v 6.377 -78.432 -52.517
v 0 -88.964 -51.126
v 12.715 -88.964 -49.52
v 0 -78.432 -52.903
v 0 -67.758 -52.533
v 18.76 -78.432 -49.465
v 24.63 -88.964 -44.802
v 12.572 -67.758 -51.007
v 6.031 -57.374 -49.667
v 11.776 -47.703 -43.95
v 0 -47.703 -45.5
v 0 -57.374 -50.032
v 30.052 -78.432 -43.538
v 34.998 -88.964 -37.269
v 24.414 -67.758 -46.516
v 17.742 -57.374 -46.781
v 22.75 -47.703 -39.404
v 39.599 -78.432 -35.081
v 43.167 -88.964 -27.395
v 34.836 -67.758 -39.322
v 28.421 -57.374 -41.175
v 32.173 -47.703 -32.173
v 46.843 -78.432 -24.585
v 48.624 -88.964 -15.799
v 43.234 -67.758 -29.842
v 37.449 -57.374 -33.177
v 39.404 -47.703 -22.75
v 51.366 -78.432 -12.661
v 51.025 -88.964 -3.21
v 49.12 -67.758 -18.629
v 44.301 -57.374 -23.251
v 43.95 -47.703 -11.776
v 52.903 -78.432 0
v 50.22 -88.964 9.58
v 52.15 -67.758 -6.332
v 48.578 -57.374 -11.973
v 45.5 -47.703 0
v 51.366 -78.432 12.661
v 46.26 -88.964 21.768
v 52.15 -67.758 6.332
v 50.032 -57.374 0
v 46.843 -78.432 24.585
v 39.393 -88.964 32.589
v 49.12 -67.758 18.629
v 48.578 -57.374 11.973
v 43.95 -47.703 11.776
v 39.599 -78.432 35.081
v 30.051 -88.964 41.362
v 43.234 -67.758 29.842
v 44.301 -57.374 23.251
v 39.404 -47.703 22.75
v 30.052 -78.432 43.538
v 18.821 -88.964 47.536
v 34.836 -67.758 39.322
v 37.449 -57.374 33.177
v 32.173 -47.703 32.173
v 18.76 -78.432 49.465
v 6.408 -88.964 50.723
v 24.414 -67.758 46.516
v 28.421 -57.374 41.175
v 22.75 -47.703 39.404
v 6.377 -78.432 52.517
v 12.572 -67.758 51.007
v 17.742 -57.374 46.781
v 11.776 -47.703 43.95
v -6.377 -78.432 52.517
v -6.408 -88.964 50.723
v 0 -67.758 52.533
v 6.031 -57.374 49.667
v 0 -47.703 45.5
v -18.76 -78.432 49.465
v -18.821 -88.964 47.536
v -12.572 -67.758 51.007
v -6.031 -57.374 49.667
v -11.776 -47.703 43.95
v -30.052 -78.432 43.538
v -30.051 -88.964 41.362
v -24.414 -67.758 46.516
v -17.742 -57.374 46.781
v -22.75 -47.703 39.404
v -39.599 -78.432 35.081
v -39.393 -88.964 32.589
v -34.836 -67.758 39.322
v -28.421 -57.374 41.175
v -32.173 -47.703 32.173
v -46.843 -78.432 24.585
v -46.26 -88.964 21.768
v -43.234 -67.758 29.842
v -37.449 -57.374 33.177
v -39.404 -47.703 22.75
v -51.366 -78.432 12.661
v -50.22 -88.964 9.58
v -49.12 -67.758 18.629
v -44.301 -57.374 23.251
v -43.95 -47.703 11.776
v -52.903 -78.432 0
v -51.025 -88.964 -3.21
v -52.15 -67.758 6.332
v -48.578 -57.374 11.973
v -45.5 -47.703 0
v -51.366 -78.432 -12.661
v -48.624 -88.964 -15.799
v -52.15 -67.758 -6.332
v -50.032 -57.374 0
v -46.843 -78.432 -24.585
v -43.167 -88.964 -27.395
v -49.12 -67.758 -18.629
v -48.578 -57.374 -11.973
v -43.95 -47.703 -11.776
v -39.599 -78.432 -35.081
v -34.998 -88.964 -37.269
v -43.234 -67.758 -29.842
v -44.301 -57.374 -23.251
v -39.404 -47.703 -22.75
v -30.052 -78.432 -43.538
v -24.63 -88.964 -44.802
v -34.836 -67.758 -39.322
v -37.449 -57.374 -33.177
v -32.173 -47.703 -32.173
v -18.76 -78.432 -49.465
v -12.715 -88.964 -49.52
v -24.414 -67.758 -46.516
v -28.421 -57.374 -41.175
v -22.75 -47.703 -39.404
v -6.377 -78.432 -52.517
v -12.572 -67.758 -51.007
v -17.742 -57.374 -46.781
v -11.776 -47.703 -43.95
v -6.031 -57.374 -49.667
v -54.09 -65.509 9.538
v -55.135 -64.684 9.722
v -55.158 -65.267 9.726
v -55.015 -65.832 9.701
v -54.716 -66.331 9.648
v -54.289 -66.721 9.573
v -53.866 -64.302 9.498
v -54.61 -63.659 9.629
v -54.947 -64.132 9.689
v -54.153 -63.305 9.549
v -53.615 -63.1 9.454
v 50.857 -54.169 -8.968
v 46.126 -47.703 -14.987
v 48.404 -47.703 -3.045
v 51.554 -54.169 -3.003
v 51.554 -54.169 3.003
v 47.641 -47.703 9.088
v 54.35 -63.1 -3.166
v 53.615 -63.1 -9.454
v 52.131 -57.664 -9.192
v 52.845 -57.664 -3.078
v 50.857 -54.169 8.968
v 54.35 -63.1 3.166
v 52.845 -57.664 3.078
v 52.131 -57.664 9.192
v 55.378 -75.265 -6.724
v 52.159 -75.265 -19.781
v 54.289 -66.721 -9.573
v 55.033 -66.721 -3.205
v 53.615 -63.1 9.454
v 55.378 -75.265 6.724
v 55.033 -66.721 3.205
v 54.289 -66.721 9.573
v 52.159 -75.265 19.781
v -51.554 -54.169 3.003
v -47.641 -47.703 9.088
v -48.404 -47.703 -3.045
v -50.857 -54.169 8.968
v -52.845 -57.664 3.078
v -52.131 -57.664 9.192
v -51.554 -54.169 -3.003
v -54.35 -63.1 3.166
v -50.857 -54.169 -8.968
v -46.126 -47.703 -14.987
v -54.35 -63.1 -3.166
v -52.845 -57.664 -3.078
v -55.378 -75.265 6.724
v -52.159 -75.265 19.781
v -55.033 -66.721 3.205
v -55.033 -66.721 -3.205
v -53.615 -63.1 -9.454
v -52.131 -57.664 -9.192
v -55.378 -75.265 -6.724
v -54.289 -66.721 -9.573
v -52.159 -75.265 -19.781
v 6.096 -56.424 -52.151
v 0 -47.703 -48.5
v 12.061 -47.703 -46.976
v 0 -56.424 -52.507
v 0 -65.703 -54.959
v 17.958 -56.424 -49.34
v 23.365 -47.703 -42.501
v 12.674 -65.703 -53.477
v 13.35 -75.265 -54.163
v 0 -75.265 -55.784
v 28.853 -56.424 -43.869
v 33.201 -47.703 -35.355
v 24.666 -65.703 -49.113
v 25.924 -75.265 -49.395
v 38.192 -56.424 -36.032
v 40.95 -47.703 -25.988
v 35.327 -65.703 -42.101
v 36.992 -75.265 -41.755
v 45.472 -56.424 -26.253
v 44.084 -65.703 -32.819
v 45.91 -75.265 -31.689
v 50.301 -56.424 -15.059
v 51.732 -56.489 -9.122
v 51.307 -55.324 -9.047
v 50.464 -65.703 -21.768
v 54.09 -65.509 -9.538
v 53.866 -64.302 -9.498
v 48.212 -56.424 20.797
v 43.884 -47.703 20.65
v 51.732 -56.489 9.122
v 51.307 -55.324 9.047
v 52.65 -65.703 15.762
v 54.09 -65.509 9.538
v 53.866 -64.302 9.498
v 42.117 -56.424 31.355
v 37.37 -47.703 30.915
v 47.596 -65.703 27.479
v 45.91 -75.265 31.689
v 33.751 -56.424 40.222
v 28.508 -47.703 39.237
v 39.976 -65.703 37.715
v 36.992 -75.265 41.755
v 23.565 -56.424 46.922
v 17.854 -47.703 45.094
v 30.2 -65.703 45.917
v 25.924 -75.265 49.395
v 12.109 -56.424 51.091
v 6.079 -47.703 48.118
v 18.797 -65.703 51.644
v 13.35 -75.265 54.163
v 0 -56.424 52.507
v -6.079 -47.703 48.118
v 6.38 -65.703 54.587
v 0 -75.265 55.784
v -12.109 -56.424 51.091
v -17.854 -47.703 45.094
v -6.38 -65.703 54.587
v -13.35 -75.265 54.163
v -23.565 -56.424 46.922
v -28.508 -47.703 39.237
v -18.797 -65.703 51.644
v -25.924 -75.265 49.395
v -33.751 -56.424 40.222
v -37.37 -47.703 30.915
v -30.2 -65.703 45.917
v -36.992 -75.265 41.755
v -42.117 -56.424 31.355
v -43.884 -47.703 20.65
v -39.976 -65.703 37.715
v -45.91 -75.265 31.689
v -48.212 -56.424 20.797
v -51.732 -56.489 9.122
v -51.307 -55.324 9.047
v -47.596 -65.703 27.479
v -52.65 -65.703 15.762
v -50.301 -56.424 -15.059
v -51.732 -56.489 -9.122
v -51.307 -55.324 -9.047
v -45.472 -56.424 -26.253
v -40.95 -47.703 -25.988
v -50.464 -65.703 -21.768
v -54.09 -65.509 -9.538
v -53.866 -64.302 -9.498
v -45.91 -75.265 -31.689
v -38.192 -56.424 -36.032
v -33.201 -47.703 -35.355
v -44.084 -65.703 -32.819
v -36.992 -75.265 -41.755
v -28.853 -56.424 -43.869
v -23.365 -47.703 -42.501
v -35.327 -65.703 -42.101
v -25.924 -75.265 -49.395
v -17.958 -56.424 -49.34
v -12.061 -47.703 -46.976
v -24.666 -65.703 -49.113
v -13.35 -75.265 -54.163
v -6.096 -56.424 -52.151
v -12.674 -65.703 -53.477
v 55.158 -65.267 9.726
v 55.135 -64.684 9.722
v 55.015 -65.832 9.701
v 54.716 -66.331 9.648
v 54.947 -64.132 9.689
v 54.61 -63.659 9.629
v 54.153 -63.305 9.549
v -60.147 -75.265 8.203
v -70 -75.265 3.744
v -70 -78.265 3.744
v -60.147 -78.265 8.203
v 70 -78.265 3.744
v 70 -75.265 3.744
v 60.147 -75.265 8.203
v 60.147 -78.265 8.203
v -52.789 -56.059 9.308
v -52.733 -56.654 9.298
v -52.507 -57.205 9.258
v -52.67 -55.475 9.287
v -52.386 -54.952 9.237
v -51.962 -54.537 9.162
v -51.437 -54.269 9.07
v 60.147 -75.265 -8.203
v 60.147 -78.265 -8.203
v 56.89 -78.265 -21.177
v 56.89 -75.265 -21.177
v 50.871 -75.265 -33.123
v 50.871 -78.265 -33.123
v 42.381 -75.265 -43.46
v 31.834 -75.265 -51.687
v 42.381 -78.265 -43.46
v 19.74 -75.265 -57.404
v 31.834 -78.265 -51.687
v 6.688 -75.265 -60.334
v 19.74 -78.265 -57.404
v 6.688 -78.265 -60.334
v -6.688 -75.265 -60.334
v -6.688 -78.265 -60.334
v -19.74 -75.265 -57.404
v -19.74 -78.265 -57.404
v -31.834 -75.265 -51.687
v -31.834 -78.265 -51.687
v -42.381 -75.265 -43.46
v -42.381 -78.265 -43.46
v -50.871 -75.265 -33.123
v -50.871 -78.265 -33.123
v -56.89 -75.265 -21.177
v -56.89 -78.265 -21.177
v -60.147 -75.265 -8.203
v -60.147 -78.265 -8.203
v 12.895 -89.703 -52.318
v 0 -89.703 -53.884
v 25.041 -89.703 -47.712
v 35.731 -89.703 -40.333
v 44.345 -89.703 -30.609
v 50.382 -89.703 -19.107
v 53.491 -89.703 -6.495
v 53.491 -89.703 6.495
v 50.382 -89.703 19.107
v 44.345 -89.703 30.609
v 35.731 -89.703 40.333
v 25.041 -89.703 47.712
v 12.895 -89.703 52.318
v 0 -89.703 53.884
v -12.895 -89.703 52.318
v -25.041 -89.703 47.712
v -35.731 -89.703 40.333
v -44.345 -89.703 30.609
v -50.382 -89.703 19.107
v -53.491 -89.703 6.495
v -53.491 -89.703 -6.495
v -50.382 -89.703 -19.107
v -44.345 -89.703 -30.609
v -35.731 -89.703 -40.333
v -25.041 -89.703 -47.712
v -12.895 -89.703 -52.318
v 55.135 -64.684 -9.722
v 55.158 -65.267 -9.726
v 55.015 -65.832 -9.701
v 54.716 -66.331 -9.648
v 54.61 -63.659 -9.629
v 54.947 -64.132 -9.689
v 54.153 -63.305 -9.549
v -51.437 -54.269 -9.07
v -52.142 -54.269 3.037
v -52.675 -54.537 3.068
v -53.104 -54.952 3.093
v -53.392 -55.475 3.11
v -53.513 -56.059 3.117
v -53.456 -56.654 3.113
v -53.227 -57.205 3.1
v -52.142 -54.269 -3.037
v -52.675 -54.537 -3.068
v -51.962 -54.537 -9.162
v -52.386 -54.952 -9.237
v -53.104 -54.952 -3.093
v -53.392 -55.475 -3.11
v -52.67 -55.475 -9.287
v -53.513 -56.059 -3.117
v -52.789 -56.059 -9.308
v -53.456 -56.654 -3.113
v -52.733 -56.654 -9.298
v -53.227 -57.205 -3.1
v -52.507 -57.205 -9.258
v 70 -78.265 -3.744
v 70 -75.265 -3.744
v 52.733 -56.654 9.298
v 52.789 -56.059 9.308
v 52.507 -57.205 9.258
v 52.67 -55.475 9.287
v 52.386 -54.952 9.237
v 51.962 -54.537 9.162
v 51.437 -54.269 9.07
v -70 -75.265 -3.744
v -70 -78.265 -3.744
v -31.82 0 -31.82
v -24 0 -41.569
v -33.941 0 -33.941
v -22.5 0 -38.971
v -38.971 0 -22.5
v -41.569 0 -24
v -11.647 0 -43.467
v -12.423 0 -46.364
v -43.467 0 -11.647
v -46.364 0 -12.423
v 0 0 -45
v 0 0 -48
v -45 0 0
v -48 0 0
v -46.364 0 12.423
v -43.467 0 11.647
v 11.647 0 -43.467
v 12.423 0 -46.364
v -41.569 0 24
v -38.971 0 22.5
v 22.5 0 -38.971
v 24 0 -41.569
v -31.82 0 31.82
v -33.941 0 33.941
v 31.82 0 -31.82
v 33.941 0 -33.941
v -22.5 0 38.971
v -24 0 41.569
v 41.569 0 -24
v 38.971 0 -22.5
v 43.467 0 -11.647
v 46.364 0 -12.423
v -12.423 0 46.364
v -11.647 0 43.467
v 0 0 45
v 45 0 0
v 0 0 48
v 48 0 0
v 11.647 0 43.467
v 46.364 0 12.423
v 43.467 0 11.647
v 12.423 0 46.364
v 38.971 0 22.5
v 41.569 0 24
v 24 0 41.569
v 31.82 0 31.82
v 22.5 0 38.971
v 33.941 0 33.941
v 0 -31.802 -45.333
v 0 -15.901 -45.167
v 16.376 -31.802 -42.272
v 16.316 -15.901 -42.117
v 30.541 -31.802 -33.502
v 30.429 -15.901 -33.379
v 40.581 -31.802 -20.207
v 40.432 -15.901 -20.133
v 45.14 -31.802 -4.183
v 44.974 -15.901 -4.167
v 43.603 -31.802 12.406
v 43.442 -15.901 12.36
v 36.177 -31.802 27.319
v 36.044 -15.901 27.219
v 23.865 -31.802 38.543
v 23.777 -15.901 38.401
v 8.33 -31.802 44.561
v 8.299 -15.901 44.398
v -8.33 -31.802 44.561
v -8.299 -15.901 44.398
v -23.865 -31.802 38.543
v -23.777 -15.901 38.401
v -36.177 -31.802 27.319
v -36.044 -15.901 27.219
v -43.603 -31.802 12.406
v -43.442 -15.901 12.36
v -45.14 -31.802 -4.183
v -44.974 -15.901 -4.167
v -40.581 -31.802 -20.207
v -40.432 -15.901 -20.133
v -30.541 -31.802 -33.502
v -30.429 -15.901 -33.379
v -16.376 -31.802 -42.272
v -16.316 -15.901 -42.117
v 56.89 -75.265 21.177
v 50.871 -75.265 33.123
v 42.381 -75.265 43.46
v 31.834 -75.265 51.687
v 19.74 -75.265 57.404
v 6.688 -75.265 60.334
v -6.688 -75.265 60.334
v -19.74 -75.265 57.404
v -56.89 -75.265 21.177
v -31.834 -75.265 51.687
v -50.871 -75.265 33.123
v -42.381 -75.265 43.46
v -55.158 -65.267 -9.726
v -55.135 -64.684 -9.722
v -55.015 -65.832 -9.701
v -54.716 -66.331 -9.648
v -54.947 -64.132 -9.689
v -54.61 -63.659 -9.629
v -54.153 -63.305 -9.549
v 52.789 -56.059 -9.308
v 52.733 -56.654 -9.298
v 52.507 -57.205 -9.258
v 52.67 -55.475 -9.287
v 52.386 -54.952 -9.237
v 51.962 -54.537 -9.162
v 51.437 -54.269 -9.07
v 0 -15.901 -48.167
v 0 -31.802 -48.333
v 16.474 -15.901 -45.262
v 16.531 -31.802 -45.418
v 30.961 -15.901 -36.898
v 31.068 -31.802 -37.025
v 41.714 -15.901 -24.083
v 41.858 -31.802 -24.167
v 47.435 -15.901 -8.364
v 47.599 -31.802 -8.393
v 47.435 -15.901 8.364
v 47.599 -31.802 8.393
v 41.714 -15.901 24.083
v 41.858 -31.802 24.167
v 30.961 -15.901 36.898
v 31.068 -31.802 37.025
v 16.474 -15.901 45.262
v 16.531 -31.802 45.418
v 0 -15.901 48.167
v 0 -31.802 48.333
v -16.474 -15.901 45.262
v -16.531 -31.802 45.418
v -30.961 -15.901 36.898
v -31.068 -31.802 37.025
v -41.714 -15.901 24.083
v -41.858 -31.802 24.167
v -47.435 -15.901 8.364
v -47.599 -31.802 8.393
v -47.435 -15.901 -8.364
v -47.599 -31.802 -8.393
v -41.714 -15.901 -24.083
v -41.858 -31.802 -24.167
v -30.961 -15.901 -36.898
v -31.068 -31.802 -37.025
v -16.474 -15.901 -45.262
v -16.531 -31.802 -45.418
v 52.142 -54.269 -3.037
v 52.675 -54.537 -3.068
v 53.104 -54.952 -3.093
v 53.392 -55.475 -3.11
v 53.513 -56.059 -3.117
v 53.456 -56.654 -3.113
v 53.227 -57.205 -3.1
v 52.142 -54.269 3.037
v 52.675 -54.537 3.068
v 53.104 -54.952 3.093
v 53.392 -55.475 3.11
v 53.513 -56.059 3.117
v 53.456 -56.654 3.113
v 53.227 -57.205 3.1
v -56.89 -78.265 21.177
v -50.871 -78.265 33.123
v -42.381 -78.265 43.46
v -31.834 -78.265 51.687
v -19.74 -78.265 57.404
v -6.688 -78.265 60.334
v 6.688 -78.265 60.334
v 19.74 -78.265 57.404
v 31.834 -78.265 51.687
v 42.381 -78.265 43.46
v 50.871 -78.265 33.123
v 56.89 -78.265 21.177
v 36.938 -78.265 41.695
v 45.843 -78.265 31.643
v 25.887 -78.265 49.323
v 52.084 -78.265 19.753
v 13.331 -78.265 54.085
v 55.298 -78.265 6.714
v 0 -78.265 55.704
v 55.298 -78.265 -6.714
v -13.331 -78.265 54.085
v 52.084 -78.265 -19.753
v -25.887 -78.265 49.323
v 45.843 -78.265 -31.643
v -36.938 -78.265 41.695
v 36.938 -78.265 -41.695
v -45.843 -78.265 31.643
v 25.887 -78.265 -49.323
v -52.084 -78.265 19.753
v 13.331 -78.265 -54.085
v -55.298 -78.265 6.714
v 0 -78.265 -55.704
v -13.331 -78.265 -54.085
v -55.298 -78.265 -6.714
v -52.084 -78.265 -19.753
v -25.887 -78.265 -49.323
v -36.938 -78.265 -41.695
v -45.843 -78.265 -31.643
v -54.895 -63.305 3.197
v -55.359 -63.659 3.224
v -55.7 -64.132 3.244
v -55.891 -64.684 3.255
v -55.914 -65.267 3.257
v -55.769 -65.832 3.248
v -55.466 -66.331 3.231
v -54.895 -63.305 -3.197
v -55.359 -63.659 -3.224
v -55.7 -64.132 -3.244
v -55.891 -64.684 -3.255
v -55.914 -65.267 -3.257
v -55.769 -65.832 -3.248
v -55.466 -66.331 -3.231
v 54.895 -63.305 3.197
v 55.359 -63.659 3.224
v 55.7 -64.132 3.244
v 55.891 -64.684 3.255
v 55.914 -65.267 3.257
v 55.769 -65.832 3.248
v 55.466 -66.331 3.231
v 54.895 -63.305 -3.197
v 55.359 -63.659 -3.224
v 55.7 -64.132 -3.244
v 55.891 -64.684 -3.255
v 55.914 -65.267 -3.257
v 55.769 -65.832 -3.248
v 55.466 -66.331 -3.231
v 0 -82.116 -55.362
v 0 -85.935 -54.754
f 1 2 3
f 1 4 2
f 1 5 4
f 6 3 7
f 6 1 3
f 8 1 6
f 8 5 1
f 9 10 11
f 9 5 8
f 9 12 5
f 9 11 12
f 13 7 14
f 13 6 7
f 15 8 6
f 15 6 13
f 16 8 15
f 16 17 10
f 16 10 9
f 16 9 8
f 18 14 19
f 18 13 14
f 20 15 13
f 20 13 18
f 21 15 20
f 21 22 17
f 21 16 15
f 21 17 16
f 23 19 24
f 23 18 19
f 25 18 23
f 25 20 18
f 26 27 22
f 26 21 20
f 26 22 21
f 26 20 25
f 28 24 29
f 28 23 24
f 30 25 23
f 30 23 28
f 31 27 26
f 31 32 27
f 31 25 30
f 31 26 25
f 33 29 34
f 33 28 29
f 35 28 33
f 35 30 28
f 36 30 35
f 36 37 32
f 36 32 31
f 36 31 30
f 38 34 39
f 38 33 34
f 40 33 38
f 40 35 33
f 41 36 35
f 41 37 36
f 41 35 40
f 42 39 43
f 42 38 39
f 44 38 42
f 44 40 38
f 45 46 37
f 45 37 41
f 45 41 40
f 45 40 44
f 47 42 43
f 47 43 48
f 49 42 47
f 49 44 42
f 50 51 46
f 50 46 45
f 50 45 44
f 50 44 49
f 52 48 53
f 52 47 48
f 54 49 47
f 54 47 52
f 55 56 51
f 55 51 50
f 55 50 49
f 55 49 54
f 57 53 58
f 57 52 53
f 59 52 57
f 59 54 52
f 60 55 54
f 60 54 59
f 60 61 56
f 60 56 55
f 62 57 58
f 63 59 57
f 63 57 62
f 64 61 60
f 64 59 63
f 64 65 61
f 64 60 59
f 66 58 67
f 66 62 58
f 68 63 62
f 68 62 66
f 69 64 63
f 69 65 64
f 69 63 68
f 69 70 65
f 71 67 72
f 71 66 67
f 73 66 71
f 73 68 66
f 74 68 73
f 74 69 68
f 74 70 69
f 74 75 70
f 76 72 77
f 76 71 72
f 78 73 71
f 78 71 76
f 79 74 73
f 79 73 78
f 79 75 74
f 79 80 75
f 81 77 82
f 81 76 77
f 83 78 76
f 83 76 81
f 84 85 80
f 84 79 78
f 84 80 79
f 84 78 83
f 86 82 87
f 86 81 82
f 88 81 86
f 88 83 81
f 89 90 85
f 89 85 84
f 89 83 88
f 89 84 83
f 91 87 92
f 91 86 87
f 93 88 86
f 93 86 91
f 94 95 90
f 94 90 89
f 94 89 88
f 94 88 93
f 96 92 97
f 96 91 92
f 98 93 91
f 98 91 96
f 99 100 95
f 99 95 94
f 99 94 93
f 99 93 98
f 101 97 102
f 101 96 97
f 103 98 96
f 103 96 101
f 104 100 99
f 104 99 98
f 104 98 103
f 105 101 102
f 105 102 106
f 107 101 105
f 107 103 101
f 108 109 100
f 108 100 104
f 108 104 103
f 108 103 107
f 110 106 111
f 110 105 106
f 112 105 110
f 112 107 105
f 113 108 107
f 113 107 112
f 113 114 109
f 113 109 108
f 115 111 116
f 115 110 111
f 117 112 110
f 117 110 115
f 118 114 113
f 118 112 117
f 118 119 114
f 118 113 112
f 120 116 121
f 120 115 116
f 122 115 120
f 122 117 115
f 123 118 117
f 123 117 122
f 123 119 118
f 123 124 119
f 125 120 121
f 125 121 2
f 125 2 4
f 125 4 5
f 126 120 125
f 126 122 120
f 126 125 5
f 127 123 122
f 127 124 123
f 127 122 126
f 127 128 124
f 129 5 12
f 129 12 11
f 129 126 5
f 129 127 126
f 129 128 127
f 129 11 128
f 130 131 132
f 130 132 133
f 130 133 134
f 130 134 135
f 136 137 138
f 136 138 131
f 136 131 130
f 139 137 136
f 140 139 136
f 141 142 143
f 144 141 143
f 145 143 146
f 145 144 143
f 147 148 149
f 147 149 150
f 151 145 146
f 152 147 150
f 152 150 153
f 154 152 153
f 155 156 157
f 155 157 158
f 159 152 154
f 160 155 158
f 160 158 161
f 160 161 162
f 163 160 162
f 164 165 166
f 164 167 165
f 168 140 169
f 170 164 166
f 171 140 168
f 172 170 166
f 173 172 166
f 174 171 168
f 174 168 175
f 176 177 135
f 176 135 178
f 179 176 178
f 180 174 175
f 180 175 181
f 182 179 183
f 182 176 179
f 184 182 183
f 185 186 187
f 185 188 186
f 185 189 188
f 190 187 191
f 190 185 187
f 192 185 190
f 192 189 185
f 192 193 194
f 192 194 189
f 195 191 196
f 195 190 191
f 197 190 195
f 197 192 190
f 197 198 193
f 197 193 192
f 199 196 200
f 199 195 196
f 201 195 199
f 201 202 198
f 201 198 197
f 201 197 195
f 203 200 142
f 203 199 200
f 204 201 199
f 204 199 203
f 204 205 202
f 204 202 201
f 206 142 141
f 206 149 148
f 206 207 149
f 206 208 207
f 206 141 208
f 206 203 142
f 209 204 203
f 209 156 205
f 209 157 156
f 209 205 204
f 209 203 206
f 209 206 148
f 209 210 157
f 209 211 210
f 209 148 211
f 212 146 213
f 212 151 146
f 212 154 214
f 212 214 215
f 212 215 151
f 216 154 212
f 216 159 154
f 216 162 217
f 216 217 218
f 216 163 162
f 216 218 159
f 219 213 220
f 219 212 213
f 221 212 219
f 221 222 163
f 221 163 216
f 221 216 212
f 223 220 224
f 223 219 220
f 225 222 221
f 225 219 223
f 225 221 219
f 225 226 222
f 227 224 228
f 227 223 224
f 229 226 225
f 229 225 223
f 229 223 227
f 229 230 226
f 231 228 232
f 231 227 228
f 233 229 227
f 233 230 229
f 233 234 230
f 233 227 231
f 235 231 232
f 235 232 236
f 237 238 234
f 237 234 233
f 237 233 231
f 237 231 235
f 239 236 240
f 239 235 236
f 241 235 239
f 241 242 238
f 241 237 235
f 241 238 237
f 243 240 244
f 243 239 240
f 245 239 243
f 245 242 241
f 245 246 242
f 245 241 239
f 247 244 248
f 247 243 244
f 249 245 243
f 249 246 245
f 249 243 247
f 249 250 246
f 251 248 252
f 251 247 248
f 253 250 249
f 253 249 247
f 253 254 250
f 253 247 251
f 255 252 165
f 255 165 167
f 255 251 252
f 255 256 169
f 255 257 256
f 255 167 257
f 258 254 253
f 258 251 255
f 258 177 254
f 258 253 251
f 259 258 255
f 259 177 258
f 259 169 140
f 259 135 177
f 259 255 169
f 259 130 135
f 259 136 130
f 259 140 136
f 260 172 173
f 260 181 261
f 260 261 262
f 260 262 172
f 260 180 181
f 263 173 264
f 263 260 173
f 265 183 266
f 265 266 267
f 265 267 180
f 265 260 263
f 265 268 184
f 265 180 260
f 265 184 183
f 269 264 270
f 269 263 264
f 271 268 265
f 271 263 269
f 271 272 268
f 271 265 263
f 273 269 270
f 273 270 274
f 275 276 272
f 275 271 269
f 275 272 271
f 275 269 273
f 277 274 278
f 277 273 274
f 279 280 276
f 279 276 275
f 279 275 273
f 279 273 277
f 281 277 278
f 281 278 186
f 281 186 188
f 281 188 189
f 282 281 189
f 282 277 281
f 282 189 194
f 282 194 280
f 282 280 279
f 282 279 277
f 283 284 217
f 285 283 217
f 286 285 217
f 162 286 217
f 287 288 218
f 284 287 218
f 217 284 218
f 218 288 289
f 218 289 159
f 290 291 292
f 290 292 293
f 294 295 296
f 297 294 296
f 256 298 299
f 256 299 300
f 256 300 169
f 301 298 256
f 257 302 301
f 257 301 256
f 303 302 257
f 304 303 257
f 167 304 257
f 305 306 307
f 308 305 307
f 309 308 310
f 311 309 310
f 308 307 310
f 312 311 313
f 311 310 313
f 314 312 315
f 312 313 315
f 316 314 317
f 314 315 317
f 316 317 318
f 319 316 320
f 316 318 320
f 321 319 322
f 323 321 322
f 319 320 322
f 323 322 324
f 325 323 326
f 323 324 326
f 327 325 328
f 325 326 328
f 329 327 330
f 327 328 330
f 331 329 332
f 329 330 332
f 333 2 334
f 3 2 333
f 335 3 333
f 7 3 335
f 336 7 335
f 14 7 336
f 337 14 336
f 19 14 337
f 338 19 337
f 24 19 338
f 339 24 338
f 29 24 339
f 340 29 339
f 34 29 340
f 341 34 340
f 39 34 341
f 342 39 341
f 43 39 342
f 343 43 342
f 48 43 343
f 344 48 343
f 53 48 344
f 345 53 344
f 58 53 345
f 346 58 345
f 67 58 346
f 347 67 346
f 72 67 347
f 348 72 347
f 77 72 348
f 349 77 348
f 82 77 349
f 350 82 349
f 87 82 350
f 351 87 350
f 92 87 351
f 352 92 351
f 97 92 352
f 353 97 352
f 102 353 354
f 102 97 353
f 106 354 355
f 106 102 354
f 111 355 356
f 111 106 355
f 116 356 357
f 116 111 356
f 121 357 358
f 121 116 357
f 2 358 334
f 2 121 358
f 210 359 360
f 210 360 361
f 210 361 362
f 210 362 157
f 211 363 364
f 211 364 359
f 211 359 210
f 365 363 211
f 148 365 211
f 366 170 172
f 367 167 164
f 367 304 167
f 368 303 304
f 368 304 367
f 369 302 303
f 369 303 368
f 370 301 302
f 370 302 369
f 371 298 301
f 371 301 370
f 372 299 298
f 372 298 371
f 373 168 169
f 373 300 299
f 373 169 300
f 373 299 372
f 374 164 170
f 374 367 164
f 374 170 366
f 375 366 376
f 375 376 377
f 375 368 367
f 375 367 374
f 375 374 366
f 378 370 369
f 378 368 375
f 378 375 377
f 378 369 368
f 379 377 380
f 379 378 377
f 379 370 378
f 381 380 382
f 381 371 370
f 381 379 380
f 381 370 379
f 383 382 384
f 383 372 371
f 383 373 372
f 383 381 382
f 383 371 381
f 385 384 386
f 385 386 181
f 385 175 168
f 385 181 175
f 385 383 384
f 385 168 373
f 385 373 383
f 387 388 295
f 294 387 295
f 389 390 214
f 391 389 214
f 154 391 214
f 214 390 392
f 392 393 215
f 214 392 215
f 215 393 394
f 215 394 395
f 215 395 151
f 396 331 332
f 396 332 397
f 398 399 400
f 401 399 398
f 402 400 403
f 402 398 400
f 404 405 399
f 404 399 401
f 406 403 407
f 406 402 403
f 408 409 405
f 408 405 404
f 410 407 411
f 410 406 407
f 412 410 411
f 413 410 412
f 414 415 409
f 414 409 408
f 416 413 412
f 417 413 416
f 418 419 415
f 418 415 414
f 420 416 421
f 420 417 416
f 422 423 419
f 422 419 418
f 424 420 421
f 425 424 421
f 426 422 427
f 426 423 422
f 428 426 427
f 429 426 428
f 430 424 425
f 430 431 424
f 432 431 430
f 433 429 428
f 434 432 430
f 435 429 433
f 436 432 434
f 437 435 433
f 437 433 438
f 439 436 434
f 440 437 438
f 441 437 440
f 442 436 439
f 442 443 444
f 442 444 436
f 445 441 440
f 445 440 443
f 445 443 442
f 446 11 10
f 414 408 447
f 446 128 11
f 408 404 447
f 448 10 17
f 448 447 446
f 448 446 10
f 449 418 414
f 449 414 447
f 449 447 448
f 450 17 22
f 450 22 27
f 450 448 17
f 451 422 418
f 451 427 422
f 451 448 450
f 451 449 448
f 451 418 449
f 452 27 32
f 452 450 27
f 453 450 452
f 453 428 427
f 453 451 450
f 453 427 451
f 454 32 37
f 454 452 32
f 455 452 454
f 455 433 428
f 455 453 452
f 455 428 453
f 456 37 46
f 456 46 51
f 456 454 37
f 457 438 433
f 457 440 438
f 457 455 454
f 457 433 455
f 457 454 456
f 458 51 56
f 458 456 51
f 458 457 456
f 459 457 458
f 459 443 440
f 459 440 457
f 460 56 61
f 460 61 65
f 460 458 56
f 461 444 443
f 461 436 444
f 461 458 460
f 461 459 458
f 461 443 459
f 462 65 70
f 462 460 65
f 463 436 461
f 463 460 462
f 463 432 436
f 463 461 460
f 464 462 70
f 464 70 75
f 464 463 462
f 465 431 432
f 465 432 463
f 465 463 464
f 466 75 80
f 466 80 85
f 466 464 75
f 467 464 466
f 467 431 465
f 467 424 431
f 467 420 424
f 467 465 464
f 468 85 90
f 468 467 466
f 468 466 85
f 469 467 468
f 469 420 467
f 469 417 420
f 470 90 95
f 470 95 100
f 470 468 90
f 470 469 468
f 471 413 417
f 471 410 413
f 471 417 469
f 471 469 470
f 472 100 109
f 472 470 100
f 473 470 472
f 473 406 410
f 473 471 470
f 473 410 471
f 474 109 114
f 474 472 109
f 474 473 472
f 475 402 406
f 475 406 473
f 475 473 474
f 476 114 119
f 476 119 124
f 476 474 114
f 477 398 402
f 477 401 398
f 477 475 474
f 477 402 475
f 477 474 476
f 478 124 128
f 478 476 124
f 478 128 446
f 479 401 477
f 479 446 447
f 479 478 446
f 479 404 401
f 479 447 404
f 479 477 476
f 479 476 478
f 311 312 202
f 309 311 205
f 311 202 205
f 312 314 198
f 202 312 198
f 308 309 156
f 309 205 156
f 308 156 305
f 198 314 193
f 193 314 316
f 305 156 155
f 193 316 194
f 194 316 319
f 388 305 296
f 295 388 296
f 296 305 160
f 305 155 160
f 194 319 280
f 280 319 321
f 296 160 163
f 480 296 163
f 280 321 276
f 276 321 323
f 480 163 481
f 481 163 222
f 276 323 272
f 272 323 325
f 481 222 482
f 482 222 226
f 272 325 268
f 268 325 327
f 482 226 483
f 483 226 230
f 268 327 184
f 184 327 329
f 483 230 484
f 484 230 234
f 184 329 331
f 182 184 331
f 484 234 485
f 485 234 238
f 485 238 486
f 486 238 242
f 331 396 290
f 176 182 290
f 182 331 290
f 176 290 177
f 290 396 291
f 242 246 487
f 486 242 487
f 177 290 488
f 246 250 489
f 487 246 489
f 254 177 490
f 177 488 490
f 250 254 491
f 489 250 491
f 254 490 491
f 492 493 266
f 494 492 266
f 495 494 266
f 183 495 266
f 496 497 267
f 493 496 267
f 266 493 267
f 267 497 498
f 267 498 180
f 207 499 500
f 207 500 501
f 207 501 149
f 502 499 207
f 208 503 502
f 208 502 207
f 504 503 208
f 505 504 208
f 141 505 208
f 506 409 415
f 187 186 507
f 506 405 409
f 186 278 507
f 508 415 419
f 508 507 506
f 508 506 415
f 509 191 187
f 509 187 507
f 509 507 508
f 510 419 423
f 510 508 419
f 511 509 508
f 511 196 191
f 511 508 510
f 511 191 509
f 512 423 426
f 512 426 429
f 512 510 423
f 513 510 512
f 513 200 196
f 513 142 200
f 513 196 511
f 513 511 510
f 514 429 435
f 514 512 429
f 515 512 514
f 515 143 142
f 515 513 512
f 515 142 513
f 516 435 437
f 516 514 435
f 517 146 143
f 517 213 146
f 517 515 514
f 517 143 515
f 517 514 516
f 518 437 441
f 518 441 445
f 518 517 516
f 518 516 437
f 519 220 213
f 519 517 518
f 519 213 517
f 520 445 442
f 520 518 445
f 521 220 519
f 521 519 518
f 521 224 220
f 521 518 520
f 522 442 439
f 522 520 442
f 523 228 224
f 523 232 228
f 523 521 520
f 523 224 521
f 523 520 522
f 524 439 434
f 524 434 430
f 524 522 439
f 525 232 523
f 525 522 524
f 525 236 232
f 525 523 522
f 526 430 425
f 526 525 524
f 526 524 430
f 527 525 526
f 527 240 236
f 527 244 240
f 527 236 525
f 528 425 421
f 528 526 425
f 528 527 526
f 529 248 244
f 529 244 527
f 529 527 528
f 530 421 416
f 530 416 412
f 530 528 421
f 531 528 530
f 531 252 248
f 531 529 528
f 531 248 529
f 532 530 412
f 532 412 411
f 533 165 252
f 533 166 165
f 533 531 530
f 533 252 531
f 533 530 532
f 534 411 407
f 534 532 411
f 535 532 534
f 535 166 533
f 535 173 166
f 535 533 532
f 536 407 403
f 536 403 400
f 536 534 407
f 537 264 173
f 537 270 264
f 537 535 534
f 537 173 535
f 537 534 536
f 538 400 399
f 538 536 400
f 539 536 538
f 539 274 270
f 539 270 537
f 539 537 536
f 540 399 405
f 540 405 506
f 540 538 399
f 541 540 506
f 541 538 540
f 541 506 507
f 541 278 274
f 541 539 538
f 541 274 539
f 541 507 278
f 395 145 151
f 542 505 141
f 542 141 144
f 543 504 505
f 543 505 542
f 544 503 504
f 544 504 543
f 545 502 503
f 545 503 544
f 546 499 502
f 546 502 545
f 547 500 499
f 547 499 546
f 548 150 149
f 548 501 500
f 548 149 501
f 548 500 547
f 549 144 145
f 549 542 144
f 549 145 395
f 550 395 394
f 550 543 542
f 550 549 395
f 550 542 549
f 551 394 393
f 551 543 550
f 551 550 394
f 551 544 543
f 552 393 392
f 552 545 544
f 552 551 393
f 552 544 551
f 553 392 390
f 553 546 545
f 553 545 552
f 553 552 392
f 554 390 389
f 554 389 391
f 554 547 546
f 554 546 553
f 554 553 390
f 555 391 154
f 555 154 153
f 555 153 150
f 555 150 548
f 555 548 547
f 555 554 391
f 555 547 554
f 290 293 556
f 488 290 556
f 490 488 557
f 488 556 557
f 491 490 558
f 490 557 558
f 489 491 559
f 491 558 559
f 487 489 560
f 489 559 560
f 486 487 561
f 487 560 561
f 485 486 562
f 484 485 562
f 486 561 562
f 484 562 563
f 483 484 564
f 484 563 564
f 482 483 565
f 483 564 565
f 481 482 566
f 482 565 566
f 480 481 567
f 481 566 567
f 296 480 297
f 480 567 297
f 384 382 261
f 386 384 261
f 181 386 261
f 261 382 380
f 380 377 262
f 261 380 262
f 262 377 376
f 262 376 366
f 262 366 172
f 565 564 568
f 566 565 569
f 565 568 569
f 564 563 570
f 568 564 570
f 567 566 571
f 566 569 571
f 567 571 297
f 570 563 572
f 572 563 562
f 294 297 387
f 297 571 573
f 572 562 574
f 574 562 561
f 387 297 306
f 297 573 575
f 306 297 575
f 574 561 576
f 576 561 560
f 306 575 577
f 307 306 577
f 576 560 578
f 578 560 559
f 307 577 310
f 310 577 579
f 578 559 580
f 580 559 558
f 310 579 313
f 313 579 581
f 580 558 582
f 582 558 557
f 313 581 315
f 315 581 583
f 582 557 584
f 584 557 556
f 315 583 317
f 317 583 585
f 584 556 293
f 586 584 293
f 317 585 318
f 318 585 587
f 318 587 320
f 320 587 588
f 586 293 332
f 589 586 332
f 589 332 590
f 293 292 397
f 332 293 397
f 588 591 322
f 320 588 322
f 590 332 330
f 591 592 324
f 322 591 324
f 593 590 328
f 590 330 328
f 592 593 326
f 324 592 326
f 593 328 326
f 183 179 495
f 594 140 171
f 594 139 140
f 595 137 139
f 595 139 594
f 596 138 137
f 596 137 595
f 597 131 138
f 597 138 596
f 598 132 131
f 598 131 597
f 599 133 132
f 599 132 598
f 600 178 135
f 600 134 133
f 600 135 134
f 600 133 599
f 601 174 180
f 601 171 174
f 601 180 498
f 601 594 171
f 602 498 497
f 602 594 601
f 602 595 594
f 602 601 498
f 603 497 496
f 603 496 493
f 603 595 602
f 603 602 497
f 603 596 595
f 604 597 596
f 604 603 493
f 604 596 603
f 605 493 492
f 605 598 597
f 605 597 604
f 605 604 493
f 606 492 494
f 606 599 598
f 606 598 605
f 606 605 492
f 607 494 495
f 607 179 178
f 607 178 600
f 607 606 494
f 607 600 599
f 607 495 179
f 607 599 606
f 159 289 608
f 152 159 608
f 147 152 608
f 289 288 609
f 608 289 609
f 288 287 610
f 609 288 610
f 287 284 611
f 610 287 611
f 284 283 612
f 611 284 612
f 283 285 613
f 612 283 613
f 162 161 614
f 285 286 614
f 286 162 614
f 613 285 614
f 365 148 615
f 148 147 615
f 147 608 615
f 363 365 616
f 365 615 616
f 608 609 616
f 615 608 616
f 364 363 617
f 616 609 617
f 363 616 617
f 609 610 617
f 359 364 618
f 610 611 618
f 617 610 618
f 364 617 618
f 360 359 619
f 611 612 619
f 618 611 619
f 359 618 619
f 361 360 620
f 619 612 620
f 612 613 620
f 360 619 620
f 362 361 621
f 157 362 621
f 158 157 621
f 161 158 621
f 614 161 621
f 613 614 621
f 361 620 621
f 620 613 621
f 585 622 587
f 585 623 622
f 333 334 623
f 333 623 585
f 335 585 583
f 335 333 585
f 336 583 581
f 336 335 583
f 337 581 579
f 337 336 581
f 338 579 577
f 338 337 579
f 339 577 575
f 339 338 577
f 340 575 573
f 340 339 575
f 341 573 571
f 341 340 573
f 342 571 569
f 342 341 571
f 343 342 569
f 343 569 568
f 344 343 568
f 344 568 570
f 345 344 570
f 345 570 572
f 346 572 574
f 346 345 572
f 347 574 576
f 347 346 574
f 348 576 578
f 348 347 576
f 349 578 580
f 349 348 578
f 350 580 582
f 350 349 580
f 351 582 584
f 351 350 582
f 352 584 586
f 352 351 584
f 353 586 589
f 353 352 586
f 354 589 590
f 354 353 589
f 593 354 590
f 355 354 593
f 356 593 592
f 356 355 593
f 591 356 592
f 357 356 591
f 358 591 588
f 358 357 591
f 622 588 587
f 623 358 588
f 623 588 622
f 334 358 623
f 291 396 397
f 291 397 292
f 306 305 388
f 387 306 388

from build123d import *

# Parameters (mm, degrees)
BOSS_EXTRUDE1_DEPTH = 3
REVOLVE3_ANGLE      = 20


with BuildPart() as part:
    # Sketch2 → Revolve1 (revolve)
    with BuildSketch(Plane(origin=(0, 0, 0), x_dir=(0, 0, -1), z_dir=(1, 0, 0))):
        with BuildLine():
            Line((45.5, -47.702841719), (45, 0))
            Line((45, 0), (48, 0))
            Line((48, 0), (48.5, -47.702841719))
            ThreePointArc((48.5, -47.702841719), (55.331762509, -68.172170296), (53.883673101, -89.702832813))
            Line((53.883673101, -89.702832813), (51.12598641, -88.963912891))
            ThreePointArc((51.12598641, -88.963912891), (52.533458966, -67.757912773), (45.5, -47.702841719))
        make_face()
    revolve(axis=Axis((0, 50.355486862, 0), (0, -1, 0)))

    # Sketch3 → Revolve2 (revolve)
    with BuildSketch(Plane(origin=(0, 0, 0), x_dir=(0, 0, -1), z_dir=(1, 0, 0))):
        with BuildLine():
            Line((55.784483274, -75.26474612), (60.703757272, -75.26474612))
            Line((60.703757272, -75.26474612), (60.703757272, -78.26474612))
            Line((60.703757272, -78.26474612), (55.703757272, -78.26474612))
            ThreePointArc((55.703757272, -78.26474612), (55.764298122, -76.765289079), (55.784483274, -75.26474612))
        make_face()
    revolve(axis=Axis((0, -123.209470333, 0), (0, 1, 0)))

    # Sketch4 → Boss-Extrude1 (add)
    with BuildSketch(Plane(origin=(0, -75.26474612, 0), x_dir=(1, 0, 0), z_dir=(0, 1, 0))):
        with BuildLine():
            Line((70, 3.743582594), (70, -3.743582594))
            Line((70, -3.743582594), (60.146968721, -8.20294463))
            ThreePointArc((60.146968721, -8.20294463), (60.703757272, 0), (60.146968721, 8.20294463))
            Line((60.146968721, 8.20294463), (70, 3.743582594))
        make_face()
        with BuildLine():
            Line((-70, -3.743582594), (-60.146968721, -8.20294463))
            ThreePointArc((-60.146968721, -8.20294463), (-60.703757272, 0), (-60.146968721, 8.20294463))
            Line((-60.146968721, 8.20294463), (-70, 3.743582594))
            Line((-70, 3.743582594), (-70, -3.743582594))
        make_face()
    extrude(amount=-BOSS_EXTRUDE1_DEPTH)

    # Sketch5 → Revolve3 (revolve, symmetric)
    with BuildSketch(Plane.XY) as revolve3_sk:
        with BuildLine():
            ThreePointArc((51.641833573, -54.16902145), (53.482411948, -55.474645579), (52.935037783, -57.66388395))
            ThreePointArc((52.935037783, -57.66388395), (52.3176263, -55.905651292), (51.641833573, -54.16902145))
        make_face()
        with BuildLine():
            ThreePointArc((54.441970224, -63.100024488), (55.985518381, -64.683651003), (55.126394669, -66.721375297))
            ThreePointArc((55.126394669, -66.721375297), (54.814096651, -64.905046197), (54.441970224, -63.100024488))
        make_face()
    revolve3 = revolve(axis=Axis((0, -123.209470333, 0), (0, 1, 0)), revolution_arc=REVOLVE3_ANGLE / 2)
    revolve3 = revolve3 + revolve(revolve3_sk.sketch, axis=Axis((0, -123.209470333, 0), (0, -1, 0)), revolution_arc=REVOLVE3_ANGLE / 2)

    # Mirror1: Revolve3 across plane
    add(revolve3.mirror(Plane(origin=(0, 0, 0), x_dir=(0, 0, 1), z_dir=(1, 0, 0))))


solid = part.part
